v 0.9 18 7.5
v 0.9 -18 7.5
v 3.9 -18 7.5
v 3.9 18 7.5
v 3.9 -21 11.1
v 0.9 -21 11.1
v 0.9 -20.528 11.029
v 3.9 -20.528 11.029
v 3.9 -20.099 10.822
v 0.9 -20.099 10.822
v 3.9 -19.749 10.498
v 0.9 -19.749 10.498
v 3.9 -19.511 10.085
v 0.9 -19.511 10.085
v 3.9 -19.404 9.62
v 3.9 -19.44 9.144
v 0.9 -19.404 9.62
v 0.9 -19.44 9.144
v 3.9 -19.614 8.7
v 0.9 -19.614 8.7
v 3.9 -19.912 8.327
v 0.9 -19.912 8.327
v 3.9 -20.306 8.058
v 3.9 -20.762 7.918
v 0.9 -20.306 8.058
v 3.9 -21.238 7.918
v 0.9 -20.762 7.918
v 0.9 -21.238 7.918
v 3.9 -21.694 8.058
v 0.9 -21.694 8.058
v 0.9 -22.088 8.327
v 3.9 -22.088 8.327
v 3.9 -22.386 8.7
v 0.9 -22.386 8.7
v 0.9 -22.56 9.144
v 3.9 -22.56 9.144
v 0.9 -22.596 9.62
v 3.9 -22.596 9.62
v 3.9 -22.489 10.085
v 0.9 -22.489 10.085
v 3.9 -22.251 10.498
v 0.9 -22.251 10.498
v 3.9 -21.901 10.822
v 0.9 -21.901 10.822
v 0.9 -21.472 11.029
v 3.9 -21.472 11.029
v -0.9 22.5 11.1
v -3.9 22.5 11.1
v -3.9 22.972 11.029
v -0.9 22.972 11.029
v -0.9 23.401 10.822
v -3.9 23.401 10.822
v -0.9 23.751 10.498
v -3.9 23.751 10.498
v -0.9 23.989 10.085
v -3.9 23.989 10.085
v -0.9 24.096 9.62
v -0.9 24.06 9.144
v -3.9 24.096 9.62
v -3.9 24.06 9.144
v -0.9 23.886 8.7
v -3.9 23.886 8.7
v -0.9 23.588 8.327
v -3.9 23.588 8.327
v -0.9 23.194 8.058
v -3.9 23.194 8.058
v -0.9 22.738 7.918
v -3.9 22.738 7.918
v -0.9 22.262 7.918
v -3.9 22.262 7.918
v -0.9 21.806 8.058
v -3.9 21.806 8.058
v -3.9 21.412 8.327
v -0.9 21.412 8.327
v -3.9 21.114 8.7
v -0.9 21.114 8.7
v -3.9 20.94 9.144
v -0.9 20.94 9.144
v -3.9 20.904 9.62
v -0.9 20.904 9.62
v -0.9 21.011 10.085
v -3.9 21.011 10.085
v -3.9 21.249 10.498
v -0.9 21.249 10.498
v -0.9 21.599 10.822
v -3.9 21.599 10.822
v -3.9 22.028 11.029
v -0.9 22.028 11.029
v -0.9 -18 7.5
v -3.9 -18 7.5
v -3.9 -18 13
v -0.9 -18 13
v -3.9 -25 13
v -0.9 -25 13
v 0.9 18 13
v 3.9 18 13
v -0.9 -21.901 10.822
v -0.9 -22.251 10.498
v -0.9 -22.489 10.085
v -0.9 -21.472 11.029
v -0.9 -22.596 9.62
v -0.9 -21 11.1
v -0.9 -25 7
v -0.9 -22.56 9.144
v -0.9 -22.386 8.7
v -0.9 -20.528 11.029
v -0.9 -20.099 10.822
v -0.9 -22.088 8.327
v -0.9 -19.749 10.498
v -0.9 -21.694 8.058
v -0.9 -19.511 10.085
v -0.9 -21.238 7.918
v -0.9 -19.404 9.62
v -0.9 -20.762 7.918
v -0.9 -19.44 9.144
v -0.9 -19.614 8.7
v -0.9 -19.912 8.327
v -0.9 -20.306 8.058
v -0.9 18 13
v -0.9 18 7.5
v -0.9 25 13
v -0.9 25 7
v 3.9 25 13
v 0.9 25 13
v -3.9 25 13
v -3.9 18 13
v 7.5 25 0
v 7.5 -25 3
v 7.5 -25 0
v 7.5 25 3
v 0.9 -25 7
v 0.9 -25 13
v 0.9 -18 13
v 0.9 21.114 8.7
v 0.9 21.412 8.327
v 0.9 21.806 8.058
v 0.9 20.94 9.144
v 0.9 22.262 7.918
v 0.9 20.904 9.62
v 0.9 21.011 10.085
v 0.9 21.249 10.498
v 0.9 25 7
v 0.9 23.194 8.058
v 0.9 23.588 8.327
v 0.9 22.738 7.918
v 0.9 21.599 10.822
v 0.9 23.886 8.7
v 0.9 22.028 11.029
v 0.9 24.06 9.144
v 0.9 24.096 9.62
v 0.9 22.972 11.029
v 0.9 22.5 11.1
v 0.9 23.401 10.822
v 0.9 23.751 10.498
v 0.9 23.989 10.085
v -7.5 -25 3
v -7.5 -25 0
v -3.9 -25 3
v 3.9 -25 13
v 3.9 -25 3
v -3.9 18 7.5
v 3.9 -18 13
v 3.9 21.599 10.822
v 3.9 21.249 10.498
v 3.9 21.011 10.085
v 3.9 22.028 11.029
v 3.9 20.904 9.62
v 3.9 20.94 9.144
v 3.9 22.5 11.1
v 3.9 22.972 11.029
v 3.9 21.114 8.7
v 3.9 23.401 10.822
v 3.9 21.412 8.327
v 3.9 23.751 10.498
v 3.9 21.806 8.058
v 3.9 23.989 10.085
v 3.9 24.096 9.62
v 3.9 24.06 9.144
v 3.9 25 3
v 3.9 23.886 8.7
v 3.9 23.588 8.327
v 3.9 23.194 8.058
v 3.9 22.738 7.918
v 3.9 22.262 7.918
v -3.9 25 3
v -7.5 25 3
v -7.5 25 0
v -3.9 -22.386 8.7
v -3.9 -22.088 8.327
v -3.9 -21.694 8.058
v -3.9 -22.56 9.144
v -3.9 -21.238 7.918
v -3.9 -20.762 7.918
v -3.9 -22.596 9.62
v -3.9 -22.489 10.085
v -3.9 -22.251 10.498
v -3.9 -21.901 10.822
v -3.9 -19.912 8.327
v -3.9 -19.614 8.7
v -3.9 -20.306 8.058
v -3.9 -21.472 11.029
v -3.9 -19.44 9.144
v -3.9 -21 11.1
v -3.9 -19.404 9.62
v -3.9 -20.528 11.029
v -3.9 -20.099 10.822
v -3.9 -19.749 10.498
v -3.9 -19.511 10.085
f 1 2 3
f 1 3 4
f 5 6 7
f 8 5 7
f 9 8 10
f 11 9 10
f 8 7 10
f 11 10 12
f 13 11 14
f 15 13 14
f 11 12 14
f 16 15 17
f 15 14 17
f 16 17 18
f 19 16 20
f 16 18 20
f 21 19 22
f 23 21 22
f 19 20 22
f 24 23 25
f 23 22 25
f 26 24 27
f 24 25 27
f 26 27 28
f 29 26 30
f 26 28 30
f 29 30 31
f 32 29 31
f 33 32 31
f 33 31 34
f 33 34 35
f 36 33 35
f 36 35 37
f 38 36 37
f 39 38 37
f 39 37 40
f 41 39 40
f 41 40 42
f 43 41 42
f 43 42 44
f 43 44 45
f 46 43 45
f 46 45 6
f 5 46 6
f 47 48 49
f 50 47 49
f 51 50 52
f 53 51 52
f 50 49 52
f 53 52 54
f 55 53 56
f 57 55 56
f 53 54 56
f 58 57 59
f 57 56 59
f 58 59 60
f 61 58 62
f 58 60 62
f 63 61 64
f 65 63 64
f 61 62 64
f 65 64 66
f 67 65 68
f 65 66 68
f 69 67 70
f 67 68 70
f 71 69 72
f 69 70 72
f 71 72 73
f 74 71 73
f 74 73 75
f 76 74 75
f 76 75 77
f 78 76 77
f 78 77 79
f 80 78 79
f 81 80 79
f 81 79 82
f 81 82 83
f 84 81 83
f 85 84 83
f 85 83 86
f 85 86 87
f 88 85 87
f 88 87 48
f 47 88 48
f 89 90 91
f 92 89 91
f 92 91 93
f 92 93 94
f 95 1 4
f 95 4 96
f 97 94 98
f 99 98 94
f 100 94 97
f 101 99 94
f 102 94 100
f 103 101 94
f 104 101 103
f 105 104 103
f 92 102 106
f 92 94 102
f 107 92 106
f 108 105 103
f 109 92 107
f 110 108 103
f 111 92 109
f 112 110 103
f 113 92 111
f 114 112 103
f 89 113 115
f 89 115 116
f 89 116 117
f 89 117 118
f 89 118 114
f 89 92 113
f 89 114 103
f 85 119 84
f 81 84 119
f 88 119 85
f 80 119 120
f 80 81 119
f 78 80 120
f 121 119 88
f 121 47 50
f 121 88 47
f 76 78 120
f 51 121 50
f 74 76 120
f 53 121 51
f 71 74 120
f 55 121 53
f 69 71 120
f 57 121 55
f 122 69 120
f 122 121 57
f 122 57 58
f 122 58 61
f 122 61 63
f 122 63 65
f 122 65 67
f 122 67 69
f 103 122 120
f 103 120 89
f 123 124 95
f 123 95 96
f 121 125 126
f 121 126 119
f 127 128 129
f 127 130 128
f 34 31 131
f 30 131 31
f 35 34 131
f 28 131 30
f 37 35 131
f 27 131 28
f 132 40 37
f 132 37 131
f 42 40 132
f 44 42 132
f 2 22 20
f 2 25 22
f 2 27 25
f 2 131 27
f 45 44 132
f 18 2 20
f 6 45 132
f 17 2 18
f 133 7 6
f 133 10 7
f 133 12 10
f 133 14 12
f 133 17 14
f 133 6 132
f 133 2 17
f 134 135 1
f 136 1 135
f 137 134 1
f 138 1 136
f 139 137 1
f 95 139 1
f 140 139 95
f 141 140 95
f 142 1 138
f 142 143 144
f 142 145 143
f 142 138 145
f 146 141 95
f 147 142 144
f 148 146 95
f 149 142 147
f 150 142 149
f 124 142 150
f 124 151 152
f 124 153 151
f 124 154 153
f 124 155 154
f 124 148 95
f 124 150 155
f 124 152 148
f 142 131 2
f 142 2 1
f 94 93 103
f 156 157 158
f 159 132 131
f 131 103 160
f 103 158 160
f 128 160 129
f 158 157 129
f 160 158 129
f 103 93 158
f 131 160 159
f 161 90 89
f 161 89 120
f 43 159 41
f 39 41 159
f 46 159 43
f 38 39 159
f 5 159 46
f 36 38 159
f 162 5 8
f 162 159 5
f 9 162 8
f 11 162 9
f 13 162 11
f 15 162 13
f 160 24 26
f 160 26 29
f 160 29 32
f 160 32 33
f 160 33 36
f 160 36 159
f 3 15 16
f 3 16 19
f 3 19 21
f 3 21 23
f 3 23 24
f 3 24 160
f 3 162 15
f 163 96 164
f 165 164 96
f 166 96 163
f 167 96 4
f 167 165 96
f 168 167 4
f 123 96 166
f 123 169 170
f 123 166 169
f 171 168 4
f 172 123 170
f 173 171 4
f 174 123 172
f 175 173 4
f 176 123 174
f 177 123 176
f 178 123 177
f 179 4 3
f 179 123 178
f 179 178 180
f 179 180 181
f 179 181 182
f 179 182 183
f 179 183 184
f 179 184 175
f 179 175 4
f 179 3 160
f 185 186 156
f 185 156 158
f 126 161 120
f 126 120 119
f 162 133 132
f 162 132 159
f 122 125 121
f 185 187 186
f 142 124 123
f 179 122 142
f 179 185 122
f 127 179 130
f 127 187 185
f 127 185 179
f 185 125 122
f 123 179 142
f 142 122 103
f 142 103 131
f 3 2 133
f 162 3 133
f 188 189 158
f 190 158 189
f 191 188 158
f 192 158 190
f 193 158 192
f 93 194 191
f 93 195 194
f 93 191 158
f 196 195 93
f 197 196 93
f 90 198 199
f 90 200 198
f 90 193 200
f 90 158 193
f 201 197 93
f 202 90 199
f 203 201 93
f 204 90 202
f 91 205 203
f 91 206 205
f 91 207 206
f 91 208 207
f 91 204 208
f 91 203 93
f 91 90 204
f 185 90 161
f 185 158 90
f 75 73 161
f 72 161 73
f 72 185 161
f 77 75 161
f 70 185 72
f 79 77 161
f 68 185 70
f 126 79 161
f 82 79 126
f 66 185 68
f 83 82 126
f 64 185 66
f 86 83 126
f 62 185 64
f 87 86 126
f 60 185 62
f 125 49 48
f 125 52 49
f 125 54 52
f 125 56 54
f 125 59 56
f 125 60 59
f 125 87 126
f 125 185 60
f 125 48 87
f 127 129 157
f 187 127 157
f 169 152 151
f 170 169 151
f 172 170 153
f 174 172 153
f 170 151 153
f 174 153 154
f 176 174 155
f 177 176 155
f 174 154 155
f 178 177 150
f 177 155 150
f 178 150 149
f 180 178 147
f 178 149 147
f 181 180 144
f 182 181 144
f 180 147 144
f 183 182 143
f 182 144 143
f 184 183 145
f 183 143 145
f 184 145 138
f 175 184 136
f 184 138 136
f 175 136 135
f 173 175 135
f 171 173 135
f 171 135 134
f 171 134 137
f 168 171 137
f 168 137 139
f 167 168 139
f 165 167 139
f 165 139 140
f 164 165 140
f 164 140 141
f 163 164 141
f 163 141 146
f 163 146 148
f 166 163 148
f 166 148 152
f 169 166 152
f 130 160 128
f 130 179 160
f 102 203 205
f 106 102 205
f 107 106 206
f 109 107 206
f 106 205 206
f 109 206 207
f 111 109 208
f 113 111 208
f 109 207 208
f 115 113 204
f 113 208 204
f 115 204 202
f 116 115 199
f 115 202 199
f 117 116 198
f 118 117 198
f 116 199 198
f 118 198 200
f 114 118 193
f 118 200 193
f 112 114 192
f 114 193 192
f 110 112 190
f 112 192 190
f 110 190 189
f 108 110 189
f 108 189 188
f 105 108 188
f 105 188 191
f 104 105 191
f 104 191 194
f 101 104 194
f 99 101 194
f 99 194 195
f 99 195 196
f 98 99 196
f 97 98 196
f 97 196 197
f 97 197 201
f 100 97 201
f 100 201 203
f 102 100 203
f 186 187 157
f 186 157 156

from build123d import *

# Parameters (mm, degrees)
BOSS_EXTRUDE1_DEPTH = 25
SKETCH2_W           = 5.5
SKETCH2_H           = 36
CUT_EXTRUDE1_DEPTH  = 31.396710348
SKETCH3_R           = 1.6
CUT_EXTRUDE2_DEPTH  = 31.396710348


with BuildPart() as part:
    # Sketch1 → Boss-Extrude1 (new, symmetric)
    with BuildSketch(Plane(origin=(0, 0, 0), x_dir=(1, 0, 0), z_dir=(0, 1, 0))):
        Polygon((7.5, 0), (-7.5, 0), (-7.5, -3), (-3.9, -3), (-3.9, -13), (-0.9, -13), (-0.9, -7), (0.9, -7), (0.9, -13), (3.9, -13), (3.9, -3), (7.5, -3), align=None)
    extrude(amount=BOSS_EXTRUDE1_DEPTH, both=True)

    # Sketch2 → Cut-Extrude1 (cut, through all)
    with BuildSketch(Plane.ZY.offset(3.9)):
        with Locations((10.25, 0)):
            Rectangle(SKETCH2_W, SKETCH2_H)
    extrude(amount=-CUT_EXTRUDE1_DEPTH, mode=Mode.SUBTRACT)

    # Sketch3 → Cut-Extrude2 (cut, through all)
    with BuildSketch(Plane.ZY.offset(3.9)):
        with Locations((9.5, 22.5)):
            Circle(SKETCH3_R)
        with Locations((9.5, -21)):
            Circle(SKETCH3_R)
    extrude(amount=-CUT_EXTRUDE2_DEPTH, mode=Mode.SUBTRACT)


solid = part.part
